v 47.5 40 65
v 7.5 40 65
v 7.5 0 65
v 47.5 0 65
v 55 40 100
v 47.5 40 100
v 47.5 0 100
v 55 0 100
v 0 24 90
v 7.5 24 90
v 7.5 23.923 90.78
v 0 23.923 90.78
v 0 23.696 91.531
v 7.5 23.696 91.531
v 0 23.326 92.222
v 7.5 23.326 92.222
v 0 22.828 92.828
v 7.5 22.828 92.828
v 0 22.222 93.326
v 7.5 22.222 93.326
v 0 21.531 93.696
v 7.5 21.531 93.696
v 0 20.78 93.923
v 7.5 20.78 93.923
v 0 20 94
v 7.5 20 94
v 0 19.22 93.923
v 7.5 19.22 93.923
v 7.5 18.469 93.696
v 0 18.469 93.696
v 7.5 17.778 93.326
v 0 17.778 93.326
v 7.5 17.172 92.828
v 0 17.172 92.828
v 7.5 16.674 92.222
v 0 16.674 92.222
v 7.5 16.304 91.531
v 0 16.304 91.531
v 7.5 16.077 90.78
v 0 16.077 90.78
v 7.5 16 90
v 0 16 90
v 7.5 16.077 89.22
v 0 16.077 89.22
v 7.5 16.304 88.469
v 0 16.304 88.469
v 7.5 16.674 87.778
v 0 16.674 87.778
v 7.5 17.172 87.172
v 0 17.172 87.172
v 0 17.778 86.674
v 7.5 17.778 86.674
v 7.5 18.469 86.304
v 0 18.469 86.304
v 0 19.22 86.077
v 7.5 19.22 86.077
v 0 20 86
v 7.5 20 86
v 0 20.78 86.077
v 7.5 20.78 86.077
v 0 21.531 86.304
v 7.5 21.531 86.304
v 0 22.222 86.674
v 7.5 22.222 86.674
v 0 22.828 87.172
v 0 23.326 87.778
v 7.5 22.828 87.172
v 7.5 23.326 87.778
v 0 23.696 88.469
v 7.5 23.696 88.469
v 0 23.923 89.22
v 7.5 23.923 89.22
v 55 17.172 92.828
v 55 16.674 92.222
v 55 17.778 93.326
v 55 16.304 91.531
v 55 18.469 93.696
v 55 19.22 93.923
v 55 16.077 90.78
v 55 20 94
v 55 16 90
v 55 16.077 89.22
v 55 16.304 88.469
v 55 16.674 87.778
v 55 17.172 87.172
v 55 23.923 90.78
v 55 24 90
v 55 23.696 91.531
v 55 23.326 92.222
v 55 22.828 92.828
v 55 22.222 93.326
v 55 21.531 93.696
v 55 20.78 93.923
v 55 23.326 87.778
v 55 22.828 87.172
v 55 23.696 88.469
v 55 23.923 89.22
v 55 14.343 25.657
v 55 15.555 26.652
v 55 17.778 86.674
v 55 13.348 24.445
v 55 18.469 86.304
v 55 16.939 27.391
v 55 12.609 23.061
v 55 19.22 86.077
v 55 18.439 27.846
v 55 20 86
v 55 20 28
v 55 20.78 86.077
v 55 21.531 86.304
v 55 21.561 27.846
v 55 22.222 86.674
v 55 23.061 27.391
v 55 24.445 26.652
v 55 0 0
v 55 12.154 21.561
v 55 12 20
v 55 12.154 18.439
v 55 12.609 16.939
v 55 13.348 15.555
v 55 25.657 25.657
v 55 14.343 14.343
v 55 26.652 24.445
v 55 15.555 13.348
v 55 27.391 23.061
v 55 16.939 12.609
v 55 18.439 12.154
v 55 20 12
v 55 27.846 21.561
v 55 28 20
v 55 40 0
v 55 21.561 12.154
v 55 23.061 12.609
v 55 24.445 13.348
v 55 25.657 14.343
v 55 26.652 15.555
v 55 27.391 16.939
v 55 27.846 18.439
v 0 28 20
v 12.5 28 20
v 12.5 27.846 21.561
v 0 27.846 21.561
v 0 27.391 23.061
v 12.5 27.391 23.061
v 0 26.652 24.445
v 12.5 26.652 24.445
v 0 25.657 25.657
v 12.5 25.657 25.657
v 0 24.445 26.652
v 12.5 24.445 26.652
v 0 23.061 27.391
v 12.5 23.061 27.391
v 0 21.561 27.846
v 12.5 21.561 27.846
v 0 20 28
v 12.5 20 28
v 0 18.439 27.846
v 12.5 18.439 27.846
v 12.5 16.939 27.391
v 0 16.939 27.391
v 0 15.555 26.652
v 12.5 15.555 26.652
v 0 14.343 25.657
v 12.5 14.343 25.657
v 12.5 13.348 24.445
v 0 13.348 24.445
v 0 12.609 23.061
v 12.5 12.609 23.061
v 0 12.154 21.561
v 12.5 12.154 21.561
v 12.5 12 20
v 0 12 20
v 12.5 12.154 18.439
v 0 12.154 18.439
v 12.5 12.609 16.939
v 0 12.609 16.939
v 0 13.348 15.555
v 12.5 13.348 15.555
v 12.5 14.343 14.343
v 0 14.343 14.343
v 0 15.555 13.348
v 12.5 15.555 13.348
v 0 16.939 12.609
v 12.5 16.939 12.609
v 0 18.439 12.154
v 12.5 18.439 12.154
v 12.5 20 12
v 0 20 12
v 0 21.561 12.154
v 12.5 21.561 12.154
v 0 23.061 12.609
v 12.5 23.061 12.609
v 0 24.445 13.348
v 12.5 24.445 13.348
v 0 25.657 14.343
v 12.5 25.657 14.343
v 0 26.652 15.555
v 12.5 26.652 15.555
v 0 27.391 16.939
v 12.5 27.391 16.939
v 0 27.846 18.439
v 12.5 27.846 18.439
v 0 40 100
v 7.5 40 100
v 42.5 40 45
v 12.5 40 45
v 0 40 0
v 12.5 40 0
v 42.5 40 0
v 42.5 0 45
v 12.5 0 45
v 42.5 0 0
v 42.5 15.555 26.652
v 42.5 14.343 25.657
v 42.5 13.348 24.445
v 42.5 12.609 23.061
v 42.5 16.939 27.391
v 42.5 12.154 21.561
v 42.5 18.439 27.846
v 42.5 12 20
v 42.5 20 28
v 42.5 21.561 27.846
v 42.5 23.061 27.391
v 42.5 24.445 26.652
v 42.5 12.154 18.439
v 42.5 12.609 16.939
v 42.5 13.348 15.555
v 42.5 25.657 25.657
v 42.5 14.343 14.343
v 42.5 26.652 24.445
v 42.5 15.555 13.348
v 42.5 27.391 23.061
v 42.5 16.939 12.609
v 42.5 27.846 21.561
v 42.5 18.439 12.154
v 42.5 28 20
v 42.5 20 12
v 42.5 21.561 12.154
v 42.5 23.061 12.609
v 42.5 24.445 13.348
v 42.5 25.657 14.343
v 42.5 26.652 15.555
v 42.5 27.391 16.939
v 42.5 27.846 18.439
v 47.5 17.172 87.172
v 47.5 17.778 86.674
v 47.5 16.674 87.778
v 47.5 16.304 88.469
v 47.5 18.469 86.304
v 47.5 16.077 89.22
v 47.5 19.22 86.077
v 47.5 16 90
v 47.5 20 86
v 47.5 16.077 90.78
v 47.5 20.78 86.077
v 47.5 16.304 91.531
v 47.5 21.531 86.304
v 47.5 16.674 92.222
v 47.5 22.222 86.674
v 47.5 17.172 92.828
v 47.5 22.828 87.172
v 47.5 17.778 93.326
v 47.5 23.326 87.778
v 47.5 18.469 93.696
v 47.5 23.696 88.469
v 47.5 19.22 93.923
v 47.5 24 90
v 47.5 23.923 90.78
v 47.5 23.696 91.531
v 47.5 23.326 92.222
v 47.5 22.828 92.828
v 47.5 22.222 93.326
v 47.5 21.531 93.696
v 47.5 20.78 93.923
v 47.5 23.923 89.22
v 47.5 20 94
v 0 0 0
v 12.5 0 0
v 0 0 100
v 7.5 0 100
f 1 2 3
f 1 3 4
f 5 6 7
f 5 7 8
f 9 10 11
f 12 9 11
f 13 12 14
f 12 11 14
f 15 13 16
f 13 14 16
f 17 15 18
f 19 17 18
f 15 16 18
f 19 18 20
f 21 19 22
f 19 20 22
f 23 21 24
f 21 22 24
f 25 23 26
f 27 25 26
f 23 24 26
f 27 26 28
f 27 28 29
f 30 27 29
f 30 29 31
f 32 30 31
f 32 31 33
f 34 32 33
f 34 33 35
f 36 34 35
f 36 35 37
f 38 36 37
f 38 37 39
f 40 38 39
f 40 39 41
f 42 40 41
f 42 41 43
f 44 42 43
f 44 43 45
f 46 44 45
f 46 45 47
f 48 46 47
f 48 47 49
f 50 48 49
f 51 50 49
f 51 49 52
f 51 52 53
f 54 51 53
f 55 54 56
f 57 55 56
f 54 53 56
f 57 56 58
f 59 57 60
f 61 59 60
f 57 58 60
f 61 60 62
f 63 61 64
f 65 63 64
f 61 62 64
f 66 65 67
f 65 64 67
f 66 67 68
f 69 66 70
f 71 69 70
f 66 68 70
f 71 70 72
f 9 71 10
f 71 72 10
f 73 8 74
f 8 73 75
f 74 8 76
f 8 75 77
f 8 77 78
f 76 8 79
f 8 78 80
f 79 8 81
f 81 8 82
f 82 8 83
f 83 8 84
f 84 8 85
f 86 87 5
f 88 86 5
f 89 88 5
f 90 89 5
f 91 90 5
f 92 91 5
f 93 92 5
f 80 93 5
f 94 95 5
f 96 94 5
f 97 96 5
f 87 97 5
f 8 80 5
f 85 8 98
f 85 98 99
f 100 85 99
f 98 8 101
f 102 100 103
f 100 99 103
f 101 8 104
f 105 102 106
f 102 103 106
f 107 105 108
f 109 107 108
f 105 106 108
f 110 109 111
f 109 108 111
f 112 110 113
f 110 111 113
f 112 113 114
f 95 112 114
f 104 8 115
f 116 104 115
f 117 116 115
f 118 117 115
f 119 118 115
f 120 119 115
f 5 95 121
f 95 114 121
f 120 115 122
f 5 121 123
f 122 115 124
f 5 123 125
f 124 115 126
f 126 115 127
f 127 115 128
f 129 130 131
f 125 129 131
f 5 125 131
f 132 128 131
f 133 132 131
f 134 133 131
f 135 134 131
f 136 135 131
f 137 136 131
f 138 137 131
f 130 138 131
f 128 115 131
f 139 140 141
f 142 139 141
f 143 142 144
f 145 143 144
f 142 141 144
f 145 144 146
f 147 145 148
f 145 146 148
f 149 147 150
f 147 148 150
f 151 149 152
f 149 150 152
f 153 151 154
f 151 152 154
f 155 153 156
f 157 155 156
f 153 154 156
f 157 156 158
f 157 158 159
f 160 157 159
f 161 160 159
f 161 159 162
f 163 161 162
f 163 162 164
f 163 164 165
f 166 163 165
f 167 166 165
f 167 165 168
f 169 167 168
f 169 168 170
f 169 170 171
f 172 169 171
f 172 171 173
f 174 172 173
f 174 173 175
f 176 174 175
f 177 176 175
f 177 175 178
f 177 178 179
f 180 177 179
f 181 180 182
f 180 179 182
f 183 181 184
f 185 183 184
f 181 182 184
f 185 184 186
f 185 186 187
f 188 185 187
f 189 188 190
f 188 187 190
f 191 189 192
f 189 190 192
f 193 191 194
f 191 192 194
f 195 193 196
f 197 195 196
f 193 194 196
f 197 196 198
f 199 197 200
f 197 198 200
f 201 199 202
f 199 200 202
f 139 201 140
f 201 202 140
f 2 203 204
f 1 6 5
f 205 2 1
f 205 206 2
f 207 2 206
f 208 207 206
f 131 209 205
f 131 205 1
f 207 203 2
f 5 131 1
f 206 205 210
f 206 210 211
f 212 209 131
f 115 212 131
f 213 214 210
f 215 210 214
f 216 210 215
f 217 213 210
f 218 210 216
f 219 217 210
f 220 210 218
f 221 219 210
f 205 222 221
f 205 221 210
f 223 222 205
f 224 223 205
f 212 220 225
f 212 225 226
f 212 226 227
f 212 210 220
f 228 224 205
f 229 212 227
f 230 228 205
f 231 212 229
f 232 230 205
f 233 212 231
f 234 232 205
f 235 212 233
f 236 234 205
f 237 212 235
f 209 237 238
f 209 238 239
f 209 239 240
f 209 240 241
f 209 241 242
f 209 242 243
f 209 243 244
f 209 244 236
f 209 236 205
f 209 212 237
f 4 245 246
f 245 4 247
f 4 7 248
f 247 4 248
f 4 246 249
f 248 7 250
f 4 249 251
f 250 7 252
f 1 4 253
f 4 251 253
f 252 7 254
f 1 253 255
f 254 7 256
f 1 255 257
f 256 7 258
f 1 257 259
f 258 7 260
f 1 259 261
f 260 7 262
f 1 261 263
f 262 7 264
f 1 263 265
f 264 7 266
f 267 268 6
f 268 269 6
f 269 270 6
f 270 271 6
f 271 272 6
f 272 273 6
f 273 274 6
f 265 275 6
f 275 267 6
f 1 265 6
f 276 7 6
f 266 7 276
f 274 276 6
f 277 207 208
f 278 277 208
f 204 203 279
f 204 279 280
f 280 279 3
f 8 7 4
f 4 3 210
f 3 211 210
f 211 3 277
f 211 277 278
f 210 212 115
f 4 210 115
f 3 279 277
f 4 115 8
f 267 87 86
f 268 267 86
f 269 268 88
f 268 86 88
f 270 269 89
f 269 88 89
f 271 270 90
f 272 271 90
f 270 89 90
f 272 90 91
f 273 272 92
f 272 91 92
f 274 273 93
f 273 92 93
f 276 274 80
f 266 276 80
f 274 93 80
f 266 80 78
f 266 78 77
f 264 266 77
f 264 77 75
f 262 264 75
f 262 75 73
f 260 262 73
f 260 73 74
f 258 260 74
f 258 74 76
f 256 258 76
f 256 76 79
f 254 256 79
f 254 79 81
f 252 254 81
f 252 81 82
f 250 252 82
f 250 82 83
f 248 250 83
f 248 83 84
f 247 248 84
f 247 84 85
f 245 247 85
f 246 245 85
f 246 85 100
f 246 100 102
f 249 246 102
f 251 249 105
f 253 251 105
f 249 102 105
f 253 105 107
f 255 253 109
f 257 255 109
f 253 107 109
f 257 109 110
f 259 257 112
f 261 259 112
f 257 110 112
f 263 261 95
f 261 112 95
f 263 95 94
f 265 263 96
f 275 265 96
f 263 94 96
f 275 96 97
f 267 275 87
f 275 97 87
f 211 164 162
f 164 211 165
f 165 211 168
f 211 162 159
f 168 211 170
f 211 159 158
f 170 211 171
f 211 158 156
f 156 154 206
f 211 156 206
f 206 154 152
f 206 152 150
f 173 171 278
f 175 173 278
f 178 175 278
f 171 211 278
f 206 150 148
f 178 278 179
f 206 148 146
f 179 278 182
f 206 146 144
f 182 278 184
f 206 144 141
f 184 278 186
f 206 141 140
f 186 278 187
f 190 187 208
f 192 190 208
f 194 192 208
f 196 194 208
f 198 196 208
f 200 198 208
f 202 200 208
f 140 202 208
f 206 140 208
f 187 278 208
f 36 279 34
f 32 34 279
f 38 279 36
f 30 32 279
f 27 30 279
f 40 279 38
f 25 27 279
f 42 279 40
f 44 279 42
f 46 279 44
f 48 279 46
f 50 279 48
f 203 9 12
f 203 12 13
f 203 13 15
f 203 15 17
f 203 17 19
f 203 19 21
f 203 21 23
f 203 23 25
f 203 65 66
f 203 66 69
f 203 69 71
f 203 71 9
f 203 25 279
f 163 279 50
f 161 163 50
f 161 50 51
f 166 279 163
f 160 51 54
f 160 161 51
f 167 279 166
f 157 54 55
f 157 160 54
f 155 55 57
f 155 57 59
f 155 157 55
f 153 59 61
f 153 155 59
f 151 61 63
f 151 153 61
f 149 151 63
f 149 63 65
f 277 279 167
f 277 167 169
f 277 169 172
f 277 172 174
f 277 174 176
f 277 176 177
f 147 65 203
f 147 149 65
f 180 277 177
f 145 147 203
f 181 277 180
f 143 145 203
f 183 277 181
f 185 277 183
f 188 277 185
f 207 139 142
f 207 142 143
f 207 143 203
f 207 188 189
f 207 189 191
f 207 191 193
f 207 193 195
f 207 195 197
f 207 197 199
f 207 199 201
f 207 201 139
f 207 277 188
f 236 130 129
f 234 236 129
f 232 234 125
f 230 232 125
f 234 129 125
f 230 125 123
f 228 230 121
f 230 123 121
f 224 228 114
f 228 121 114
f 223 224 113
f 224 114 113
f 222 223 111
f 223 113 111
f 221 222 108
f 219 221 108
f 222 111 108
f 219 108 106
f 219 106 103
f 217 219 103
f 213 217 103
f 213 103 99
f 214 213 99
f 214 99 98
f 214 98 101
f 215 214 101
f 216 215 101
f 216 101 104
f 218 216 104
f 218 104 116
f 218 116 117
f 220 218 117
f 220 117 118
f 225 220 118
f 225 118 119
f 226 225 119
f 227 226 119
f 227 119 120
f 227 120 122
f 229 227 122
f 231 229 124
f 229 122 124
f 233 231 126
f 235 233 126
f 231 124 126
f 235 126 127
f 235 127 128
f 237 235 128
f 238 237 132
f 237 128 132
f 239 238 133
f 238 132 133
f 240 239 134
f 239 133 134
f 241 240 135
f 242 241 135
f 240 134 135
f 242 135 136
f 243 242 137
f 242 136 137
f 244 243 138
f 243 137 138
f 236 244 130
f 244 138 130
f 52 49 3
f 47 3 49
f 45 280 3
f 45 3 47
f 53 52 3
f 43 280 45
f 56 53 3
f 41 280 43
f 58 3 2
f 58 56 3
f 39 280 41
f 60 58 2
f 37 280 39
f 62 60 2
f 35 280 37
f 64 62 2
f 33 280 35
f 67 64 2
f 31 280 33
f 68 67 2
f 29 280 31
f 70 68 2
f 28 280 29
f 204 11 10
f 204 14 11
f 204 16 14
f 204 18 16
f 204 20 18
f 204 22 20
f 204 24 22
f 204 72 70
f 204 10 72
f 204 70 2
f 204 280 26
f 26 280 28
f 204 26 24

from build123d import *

# Parameters (mm, degrees)
SKETCH1_W           = 55
SKETCH1_H           = 40
BOSS_EXTRUDE1_DEPTH = 100
SKETCH2_W           = 40
SKETCH2_H           = 40
CUT_EXTRUDE1_DEPTH  = 35
SKETCH3_R           = 4
SKETCH3_R_2         = 8
CUT_EXTRUDE2_DEPTH  = 121.933866224
SKETCH4_W           = 30
SKETCH4_H           = 40
CUT_EXTRUDE3_DEPTH  = 45


with BuildPart() as part:
    # Sketch1 → Boss-Extrude1 (new body)
    with BuildSketch(Plane.XY):
        with Locations((27.5, 20)):
            Rectangle(SKETCH1_W, SKETCH1_H)
    extrude(amount=BOSS_EXTRUDE1_DEPTH)

    # Sketch2 → Cut-Extrude1 (cut)
    with BuildSketch(Plane.XY.offset(100)):
        with Locations((27.5, 20)):
            Rectangle(SKETCH2_W, SKETCH2_H)
    extrude(amount=-CUT_EXTRUDE1_DEPTH, mode=Mode.SUBTRACT)

    # Sketch3 → Cut-Extrude2 (cut, through all)
    with BuildSketch(Plane(origin=(55, 0, 0), x_dir=(0, 0, -1), z_dir=(1, 0, 0))):
        with Locations(Location((-90, 20, 0), (0, 0, 90))):
            Circle(SKETCH3_R)
        with Locations(Location((-20, 20, 0), (0, 0, 90))):
            Circle(SKETCH3_R_2)
    extrude(amount=-CUT_EXTRUDE2_DEPTH, mode=Mode.SUBTRACT)

    # Sketch4 → Cut-Extrude3 (cut)
    with BuildSketch(Plane(origin=(0, 0, 0), x_dir=(-1, 0, 0), z_dir=(0, 0, -1))):
        with Locations((-27.5, 20)):
            Rectangle(SKETCH4_W, SKETCH4_H)
    extrude(amount=-CUT_EXTRUDE3_DEPTH, mode=Mode.SUBTRACT)


solid = part.part
